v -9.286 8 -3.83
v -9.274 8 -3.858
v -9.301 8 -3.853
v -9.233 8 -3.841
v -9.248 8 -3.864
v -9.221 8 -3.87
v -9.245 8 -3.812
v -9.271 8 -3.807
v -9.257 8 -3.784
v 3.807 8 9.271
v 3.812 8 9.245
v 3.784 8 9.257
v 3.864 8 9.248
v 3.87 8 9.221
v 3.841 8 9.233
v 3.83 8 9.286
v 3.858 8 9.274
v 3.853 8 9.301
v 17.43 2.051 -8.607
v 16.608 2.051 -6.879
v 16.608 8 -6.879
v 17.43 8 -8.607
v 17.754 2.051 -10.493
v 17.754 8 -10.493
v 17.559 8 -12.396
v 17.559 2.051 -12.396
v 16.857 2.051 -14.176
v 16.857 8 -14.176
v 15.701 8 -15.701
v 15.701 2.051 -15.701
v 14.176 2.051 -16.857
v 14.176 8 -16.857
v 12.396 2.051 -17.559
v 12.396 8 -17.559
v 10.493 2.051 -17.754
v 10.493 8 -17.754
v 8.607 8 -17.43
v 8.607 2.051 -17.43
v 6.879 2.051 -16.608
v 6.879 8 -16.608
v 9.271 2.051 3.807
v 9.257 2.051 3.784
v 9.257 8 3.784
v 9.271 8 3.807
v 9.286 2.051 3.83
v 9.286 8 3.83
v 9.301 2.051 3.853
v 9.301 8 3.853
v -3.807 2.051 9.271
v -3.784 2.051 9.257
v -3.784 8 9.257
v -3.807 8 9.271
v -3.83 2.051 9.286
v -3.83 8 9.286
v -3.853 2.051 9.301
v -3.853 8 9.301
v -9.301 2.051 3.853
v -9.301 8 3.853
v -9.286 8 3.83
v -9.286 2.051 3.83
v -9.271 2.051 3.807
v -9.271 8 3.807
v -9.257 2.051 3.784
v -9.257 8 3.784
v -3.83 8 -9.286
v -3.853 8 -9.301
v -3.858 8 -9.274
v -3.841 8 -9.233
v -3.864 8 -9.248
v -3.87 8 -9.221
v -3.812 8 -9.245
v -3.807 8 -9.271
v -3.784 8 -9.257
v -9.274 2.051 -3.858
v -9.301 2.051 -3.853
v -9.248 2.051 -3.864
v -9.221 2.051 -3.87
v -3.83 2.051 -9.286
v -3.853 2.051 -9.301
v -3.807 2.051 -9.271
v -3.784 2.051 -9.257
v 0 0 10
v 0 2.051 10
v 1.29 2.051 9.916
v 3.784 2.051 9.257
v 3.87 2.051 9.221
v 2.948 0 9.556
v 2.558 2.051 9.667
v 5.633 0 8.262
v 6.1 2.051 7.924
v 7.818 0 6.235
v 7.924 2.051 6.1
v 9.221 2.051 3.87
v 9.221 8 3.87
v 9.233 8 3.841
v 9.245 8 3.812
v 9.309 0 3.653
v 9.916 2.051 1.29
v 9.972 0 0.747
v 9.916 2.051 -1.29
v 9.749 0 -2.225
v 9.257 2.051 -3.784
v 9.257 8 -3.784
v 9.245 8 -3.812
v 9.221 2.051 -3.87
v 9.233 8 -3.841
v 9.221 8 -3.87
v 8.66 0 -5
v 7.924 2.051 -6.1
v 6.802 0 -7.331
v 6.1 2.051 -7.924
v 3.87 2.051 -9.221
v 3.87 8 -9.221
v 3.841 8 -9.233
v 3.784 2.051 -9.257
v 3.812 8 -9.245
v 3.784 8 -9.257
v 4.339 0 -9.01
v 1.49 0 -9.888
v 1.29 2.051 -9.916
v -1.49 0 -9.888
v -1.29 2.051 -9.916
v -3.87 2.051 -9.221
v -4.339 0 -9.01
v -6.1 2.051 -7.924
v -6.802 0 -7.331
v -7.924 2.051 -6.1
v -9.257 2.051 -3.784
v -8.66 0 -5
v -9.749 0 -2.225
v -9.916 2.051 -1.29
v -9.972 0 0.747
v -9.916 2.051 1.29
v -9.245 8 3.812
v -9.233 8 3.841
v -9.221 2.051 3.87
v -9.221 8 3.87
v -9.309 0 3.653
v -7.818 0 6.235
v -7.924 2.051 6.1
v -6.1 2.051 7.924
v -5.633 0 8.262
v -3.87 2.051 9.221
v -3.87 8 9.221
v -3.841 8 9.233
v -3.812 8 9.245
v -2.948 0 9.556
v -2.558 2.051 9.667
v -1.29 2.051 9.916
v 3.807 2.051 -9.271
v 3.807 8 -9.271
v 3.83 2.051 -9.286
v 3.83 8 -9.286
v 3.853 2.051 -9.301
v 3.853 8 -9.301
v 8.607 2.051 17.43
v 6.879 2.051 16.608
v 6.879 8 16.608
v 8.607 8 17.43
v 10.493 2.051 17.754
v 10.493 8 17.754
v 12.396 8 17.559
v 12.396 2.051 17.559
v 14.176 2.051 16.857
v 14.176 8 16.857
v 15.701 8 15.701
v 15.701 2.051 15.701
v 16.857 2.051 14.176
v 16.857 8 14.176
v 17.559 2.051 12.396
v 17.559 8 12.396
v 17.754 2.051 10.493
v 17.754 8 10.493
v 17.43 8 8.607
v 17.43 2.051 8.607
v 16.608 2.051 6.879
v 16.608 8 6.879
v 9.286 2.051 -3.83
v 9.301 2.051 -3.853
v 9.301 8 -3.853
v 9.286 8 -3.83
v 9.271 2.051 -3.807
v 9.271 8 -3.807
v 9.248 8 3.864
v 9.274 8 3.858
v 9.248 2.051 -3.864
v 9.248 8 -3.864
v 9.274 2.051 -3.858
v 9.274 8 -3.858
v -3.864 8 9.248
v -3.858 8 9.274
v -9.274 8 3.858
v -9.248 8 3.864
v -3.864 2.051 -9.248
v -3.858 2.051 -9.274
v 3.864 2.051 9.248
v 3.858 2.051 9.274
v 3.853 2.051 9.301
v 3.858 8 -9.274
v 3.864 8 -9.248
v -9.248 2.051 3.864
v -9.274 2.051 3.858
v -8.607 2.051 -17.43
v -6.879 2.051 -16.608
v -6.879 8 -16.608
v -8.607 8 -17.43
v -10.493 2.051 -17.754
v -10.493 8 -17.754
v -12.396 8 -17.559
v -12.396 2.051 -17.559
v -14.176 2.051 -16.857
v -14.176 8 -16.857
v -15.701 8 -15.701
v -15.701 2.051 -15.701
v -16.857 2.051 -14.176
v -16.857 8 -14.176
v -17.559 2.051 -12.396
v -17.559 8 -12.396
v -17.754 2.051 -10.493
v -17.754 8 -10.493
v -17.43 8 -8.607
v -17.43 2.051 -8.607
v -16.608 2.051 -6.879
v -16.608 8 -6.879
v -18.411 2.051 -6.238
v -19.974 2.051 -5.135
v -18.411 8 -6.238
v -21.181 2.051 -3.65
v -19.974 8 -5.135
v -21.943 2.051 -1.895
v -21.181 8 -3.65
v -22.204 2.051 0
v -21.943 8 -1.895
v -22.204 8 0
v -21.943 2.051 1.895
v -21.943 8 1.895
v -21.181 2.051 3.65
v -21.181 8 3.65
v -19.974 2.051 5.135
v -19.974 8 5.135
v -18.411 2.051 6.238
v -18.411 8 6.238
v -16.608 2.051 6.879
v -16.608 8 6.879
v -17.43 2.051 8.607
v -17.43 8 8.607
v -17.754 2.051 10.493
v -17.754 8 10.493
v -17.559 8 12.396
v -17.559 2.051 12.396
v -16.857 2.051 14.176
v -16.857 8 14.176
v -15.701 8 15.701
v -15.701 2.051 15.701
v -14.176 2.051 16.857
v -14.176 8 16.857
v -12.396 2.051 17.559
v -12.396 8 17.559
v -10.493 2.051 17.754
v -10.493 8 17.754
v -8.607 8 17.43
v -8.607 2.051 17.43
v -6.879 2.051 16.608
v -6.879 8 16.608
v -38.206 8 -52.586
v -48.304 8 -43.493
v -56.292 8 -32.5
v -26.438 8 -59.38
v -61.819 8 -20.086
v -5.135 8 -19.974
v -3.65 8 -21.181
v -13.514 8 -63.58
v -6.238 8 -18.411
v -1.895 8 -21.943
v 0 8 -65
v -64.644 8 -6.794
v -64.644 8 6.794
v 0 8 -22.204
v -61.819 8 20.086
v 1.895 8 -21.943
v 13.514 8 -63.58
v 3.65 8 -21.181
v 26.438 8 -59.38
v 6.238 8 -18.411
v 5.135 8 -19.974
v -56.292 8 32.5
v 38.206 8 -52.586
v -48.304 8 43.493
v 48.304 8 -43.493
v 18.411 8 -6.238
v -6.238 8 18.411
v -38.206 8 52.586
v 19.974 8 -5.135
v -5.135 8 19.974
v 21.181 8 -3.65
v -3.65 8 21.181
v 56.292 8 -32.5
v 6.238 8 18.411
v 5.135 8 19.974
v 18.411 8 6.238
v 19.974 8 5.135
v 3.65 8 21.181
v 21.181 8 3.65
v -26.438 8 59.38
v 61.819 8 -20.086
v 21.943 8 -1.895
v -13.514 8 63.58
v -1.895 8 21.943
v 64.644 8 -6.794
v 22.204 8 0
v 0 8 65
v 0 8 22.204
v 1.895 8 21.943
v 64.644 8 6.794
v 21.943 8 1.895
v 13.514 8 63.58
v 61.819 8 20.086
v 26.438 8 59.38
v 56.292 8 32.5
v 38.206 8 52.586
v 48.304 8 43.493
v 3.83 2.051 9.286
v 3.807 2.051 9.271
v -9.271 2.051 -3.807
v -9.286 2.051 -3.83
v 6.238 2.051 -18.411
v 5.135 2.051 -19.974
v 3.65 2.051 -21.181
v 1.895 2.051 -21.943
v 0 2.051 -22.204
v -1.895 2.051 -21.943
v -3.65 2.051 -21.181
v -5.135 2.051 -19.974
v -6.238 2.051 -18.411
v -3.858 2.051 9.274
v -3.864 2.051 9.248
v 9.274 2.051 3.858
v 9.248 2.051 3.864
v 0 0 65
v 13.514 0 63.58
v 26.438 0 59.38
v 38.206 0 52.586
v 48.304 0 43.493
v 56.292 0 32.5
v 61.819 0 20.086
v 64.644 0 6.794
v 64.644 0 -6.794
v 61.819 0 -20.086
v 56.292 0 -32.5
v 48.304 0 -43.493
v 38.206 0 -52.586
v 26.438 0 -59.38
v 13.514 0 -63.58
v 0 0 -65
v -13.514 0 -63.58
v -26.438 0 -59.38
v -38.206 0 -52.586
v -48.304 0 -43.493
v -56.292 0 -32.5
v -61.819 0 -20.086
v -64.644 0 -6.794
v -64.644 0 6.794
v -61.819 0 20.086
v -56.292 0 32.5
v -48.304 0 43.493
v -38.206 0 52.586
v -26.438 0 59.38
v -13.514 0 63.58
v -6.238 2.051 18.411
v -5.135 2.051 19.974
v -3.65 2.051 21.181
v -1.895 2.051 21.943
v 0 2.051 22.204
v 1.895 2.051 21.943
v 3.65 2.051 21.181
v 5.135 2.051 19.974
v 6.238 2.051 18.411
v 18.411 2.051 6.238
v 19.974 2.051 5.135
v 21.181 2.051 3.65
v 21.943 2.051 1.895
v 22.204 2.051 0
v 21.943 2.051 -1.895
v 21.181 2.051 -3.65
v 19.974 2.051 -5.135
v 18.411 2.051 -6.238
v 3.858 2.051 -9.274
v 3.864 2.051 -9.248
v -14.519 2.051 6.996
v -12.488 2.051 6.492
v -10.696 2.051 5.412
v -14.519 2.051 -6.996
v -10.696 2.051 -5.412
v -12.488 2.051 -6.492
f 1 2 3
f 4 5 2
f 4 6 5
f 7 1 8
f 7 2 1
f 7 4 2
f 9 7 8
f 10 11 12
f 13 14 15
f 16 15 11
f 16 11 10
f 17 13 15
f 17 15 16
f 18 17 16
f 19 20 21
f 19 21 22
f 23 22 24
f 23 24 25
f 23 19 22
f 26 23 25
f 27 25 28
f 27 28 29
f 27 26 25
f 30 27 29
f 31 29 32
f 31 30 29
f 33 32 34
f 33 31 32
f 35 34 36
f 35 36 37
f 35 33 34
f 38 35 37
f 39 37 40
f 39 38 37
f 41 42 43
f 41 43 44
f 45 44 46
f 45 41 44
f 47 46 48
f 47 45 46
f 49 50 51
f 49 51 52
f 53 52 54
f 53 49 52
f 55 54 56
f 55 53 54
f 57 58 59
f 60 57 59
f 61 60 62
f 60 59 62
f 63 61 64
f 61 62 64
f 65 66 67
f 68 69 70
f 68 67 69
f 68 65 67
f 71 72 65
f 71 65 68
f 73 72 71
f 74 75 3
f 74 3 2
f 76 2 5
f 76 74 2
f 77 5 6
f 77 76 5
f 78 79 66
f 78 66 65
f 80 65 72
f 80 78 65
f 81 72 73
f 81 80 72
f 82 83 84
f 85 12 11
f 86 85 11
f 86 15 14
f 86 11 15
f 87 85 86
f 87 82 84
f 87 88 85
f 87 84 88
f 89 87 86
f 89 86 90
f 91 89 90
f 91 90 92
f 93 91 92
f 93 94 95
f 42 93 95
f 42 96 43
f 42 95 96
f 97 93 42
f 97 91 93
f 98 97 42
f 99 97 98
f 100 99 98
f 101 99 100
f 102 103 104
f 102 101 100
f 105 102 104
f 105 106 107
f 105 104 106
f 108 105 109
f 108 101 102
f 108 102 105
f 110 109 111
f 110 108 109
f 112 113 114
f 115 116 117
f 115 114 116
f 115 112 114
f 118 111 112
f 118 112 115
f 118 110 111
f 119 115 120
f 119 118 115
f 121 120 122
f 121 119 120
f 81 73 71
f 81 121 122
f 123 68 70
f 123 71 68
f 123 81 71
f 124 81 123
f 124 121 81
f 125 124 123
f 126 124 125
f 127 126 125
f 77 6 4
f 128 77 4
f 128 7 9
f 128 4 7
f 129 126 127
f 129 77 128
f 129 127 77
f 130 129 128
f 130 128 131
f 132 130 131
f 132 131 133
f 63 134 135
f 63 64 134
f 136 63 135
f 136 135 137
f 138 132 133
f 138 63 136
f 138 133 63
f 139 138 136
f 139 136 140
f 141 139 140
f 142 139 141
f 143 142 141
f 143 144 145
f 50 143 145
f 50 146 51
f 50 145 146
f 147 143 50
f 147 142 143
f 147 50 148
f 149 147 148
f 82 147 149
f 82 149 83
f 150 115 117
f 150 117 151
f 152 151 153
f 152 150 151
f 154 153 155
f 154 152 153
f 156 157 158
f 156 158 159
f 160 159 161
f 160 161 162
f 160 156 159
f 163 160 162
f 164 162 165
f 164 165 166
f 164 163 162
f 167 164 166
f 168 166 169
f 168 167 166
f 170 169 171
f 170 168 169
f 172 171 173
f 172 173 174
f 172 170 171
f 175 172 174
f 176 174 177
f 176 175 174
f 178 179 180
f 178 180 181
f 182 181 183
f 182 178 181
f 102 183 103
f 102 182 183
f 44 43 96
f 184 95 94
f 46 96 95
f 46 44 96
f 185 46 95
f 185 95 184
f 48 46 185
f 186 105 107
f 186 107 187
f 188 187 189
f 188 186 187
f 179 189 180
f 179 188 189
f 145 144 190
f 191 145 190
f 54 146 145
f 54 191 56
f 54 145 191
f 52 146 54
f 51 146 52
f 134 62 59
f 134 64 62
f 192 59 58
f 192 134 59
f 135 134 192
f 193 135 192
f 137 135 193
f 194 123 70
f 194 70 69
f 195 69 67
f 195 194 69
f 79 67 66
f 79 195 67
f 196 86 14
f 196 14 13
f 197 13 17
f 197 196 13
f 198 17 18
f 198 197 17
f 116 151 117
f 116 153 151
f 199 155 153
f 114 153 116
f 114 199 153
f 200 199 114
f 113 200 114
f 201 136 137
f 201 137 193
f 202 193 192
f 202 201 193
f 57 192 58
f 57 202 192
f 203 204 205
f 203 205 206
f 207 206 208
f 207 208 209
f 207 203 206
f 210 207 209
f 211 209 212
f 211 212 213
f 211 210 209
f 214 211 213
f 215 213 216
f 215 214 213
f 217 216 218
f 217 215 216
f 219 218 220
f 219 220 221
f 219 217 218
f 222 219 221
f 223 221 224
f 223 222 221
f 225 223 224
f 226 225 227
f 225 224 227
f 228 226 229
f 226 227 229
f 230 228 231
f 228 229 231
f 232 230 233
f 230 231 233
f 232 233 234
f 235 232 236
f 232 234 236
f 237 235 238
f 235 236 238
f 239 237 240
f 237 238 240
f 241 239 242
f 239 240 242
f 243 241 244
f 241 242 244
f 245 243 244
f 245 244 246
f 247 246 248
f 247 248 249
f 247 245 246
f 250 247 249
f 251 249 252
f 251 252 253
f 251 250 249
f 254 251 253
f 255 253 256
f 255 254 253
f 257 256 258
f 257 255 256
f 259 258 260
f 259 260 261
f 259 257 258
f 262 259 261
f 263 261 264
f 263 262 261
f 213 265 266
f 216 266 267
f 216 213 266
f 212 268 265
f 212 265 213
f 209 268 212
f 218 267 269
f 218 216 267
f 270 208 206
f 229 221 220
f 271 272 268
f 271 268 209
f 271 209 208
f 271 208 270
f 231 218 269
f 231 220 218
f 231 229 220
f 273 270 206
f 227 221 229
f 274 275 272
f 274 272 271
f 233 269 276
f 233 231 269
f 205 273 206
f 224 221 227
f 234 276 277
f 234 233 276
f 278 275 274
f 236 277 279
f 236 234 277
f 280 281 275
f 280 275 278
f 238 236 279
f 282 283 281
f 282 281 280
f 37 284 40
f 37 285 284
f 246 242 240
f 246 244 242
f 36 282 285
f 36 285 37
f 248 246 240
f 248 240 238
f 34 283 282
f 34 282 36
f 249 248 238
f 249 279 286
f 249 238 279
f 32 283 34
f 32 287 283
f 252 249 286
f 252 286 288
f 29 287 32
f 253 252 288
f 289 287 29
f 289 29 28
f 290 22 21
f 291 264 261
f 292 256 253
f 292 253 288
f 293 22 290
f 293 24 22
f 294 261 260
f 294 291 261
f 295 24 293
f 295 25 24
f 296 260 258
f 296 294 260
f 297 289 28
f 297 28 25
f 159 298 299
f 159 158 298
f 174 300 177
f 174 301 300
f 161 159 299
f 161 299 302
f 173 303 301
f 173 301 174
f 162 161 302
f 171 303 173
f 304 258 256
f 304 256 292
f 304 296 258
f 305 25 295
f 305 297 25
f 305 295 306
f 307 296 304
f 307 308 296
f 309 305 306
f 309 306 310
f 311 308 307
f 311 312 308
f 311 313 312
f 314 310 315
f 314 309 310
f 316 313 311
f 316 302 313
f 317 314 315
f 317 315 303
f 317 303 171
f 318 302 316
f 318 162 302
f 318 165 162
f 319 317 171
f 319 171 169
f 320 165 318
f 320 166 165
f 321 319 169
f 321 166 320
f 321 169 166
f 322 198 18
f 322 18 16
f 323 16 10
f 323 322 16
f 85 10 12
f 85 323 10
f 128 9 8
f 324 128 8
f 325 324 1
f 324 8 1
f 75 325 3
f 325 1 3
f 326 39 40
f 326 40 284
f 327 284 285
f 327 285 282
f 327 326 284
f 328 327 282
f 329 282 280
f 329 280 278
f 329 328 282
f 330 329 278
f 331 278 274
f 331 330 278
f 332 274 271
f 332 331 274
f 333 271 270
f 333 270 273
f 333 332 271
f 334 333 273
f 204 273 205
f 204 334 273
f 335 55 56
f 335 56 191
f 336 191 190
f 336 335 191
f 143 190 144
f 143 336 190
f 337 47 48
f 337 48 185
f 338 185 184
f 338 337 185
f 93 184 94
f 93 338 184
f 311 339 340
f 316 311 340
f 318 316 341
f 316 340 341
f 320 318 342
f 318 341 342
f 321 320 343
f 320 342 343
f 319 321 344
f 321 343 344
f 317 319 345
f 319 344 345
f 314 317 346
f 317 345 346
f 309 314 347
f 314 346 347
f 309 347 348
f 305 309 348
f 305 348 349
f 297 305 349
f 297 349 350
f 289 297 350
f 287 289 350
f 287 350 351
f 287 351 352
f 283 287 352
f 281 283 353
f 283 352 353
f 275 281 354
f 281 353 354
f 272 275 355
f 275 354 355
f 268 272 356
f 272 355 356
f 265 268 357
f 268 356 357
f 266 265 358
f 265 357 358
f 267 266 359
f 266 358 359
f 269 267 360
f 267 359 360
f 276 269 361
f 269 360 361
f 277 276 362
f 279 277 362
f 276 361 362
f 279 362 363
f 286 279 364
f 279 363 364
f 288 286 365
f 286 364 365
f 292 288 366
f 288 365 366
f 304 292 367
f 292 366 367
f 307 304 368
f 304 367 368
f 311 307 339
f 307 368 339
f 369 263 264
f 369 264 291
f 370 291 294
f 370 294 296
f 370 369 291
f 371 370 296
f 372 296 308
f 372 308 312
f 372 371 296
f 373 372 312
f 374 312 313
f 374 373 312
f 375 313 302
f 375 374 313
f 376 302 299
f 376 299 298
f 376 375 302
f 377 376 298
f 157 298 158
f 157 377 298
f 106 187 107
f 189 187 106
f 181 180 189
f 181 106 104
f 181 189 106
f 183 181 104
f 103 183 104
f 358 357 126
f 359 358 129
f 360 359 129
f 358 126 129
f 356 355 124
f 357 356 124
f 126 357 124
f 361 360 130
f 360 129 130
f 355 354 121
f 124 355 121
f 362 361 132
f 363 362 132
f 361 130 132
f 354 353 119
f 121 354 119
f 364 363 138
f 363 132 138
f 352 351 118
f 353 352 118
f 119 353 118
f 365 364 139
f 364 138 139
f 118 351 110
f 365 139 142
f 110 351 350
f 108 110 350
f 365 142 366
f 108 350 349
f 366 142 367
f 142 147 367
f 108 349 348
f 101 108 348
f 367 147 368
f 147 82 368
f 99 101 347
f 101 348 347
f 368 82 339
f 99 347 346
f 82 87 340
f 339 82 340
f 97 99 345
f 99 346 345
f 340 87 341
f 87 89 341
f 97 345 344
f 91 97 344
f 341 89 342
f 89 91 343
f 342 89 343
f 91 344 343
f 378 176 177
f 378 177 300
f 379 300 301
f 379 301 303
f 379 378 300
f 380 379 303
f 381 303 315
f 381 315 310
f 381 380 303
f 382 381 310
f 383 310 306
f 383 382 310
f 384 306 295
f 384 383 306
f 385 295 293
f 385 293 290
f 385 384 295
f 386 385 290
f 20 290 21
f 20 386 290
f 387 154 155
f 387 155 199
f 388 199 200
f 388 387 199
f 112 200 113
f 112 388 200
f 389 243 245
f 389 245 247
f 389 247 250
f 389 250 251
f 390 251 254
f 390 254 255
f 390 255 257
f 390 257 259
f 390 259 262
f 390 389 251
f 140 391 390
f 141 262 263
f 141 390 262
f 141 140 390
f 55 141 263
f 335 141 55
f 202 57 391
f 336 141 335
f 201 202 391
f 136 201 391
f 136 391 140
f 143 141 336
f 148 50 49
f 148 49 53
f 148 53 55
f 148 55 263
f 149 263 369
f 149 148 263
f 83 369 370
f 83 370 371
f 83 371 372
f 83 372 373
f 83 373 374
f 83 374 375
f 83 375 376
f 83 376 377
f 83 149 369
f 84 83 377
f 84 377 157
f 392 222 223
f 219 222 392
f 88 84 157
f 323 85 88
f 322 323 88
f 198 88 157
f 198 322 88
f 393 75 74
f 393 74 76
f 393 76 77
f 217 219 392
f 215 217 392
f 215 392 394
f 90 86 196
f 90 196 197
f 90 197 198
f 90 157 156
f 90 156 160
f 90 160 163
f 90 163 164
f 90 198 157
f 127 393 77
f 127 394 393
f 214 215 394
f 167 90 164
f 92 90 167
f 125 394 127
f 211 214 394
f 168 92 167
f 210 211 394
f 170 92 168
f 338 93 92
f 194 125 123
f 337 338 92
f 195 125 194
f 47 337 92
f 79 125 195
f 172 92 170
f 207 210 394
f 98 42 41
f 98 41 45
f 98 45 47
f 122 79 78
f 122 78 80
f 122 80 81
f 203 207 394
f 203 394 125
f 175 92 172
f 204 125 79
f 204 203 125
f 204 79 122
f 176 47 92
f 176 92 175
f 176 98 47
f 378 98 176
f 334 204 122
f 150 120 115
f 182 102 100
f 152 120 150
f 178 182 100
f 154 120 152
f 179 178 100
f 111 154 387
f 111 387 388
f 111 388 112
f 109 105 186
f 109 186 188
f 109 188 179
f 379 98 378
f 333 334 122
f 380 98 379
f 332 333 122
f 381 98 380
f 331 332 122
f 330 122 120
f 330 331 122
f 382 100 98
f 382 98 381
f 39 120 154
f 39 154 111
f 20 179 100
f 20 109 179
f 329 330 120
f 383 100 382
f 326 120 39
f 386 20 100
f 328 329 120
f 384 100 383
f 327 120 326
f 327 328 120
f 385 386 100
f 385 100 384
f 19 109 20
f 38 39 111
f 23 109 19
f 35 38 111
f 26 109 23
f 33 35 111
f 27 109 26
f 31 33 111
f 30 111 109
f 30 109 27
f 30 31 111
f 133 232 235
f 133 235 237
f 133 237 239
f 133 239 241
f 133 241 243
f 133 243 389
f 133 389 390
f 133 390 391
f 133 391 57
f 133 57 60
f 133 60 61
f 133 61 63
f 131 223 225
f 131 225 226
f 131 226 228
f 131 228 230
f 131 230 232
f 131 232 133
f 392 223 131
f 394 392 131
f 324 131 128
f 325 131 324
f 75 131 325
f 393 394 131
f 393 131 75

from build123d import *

# Parameters (mm, degrees)
SKETCH1_R           = 65
BOSS_EXTRUDE1_DEPTH = 8
SKETCH2_R           = 10
CUT_EXTRUDE1_DEPTH  = 93.271338995
SKETCH3_R           = 7.026572085
CUT_EXTRUDE2_DEPTH  = 5.949077474
CIRPATTERN1_COUNT   = 8


with BuildPart() as part:
    # Sketch1 → Boss-Extrude1 (new body)
    with BuildSketch(Plane(origin=(0, 0, 0), x_dir=(1, 0, 0), z_dir=(0, 1, 0))):
        Circle(SKETCH1_R)
    extrude(amount=BOSS_EXTRUDE1_DEPTH)

    # Sketch2 → Cut-Extrude1 (cut, through all)
    with BuildSketch(Plane(origin=(0, 0, 0), x_dir=(1, 0, 0), z_dir=(0, 1, 0))):
        Circle(SKETCH2_R)
    extrude(amount=CUT_EXTRUDE1_DEPTH, mode=Mode.SUBTRACT)

    # Sketch3 → Cut-Extrude2 (cut)
    with BuildSketch(Plane(origin=(0, 8, 0), x_dir=(1, 0, 0), z_dir=(0, 1, 0))):
        with Locations((-15.177293881, 0)):
            Circle(SKETCH3_R)
    cut_extrude2 = extrude(amount=-CUT_EXTRUDE2_DEPTH, mode=Mode.SUBTRACT)

    # CirPattern1: Cut-Extrude2 ×8 about axis
    cirpattern1_axis = Axis((0, 0, 0), (0, 1, 0))
    for i in range(1, CIRPATTERN1_COUNT):
        add(cut_extrude2.rotate(cirpattern1_axis, i * 360 / CIRPATTERN1_COUNT), mode=Mode.SUBTRACT)


solid = part.part
